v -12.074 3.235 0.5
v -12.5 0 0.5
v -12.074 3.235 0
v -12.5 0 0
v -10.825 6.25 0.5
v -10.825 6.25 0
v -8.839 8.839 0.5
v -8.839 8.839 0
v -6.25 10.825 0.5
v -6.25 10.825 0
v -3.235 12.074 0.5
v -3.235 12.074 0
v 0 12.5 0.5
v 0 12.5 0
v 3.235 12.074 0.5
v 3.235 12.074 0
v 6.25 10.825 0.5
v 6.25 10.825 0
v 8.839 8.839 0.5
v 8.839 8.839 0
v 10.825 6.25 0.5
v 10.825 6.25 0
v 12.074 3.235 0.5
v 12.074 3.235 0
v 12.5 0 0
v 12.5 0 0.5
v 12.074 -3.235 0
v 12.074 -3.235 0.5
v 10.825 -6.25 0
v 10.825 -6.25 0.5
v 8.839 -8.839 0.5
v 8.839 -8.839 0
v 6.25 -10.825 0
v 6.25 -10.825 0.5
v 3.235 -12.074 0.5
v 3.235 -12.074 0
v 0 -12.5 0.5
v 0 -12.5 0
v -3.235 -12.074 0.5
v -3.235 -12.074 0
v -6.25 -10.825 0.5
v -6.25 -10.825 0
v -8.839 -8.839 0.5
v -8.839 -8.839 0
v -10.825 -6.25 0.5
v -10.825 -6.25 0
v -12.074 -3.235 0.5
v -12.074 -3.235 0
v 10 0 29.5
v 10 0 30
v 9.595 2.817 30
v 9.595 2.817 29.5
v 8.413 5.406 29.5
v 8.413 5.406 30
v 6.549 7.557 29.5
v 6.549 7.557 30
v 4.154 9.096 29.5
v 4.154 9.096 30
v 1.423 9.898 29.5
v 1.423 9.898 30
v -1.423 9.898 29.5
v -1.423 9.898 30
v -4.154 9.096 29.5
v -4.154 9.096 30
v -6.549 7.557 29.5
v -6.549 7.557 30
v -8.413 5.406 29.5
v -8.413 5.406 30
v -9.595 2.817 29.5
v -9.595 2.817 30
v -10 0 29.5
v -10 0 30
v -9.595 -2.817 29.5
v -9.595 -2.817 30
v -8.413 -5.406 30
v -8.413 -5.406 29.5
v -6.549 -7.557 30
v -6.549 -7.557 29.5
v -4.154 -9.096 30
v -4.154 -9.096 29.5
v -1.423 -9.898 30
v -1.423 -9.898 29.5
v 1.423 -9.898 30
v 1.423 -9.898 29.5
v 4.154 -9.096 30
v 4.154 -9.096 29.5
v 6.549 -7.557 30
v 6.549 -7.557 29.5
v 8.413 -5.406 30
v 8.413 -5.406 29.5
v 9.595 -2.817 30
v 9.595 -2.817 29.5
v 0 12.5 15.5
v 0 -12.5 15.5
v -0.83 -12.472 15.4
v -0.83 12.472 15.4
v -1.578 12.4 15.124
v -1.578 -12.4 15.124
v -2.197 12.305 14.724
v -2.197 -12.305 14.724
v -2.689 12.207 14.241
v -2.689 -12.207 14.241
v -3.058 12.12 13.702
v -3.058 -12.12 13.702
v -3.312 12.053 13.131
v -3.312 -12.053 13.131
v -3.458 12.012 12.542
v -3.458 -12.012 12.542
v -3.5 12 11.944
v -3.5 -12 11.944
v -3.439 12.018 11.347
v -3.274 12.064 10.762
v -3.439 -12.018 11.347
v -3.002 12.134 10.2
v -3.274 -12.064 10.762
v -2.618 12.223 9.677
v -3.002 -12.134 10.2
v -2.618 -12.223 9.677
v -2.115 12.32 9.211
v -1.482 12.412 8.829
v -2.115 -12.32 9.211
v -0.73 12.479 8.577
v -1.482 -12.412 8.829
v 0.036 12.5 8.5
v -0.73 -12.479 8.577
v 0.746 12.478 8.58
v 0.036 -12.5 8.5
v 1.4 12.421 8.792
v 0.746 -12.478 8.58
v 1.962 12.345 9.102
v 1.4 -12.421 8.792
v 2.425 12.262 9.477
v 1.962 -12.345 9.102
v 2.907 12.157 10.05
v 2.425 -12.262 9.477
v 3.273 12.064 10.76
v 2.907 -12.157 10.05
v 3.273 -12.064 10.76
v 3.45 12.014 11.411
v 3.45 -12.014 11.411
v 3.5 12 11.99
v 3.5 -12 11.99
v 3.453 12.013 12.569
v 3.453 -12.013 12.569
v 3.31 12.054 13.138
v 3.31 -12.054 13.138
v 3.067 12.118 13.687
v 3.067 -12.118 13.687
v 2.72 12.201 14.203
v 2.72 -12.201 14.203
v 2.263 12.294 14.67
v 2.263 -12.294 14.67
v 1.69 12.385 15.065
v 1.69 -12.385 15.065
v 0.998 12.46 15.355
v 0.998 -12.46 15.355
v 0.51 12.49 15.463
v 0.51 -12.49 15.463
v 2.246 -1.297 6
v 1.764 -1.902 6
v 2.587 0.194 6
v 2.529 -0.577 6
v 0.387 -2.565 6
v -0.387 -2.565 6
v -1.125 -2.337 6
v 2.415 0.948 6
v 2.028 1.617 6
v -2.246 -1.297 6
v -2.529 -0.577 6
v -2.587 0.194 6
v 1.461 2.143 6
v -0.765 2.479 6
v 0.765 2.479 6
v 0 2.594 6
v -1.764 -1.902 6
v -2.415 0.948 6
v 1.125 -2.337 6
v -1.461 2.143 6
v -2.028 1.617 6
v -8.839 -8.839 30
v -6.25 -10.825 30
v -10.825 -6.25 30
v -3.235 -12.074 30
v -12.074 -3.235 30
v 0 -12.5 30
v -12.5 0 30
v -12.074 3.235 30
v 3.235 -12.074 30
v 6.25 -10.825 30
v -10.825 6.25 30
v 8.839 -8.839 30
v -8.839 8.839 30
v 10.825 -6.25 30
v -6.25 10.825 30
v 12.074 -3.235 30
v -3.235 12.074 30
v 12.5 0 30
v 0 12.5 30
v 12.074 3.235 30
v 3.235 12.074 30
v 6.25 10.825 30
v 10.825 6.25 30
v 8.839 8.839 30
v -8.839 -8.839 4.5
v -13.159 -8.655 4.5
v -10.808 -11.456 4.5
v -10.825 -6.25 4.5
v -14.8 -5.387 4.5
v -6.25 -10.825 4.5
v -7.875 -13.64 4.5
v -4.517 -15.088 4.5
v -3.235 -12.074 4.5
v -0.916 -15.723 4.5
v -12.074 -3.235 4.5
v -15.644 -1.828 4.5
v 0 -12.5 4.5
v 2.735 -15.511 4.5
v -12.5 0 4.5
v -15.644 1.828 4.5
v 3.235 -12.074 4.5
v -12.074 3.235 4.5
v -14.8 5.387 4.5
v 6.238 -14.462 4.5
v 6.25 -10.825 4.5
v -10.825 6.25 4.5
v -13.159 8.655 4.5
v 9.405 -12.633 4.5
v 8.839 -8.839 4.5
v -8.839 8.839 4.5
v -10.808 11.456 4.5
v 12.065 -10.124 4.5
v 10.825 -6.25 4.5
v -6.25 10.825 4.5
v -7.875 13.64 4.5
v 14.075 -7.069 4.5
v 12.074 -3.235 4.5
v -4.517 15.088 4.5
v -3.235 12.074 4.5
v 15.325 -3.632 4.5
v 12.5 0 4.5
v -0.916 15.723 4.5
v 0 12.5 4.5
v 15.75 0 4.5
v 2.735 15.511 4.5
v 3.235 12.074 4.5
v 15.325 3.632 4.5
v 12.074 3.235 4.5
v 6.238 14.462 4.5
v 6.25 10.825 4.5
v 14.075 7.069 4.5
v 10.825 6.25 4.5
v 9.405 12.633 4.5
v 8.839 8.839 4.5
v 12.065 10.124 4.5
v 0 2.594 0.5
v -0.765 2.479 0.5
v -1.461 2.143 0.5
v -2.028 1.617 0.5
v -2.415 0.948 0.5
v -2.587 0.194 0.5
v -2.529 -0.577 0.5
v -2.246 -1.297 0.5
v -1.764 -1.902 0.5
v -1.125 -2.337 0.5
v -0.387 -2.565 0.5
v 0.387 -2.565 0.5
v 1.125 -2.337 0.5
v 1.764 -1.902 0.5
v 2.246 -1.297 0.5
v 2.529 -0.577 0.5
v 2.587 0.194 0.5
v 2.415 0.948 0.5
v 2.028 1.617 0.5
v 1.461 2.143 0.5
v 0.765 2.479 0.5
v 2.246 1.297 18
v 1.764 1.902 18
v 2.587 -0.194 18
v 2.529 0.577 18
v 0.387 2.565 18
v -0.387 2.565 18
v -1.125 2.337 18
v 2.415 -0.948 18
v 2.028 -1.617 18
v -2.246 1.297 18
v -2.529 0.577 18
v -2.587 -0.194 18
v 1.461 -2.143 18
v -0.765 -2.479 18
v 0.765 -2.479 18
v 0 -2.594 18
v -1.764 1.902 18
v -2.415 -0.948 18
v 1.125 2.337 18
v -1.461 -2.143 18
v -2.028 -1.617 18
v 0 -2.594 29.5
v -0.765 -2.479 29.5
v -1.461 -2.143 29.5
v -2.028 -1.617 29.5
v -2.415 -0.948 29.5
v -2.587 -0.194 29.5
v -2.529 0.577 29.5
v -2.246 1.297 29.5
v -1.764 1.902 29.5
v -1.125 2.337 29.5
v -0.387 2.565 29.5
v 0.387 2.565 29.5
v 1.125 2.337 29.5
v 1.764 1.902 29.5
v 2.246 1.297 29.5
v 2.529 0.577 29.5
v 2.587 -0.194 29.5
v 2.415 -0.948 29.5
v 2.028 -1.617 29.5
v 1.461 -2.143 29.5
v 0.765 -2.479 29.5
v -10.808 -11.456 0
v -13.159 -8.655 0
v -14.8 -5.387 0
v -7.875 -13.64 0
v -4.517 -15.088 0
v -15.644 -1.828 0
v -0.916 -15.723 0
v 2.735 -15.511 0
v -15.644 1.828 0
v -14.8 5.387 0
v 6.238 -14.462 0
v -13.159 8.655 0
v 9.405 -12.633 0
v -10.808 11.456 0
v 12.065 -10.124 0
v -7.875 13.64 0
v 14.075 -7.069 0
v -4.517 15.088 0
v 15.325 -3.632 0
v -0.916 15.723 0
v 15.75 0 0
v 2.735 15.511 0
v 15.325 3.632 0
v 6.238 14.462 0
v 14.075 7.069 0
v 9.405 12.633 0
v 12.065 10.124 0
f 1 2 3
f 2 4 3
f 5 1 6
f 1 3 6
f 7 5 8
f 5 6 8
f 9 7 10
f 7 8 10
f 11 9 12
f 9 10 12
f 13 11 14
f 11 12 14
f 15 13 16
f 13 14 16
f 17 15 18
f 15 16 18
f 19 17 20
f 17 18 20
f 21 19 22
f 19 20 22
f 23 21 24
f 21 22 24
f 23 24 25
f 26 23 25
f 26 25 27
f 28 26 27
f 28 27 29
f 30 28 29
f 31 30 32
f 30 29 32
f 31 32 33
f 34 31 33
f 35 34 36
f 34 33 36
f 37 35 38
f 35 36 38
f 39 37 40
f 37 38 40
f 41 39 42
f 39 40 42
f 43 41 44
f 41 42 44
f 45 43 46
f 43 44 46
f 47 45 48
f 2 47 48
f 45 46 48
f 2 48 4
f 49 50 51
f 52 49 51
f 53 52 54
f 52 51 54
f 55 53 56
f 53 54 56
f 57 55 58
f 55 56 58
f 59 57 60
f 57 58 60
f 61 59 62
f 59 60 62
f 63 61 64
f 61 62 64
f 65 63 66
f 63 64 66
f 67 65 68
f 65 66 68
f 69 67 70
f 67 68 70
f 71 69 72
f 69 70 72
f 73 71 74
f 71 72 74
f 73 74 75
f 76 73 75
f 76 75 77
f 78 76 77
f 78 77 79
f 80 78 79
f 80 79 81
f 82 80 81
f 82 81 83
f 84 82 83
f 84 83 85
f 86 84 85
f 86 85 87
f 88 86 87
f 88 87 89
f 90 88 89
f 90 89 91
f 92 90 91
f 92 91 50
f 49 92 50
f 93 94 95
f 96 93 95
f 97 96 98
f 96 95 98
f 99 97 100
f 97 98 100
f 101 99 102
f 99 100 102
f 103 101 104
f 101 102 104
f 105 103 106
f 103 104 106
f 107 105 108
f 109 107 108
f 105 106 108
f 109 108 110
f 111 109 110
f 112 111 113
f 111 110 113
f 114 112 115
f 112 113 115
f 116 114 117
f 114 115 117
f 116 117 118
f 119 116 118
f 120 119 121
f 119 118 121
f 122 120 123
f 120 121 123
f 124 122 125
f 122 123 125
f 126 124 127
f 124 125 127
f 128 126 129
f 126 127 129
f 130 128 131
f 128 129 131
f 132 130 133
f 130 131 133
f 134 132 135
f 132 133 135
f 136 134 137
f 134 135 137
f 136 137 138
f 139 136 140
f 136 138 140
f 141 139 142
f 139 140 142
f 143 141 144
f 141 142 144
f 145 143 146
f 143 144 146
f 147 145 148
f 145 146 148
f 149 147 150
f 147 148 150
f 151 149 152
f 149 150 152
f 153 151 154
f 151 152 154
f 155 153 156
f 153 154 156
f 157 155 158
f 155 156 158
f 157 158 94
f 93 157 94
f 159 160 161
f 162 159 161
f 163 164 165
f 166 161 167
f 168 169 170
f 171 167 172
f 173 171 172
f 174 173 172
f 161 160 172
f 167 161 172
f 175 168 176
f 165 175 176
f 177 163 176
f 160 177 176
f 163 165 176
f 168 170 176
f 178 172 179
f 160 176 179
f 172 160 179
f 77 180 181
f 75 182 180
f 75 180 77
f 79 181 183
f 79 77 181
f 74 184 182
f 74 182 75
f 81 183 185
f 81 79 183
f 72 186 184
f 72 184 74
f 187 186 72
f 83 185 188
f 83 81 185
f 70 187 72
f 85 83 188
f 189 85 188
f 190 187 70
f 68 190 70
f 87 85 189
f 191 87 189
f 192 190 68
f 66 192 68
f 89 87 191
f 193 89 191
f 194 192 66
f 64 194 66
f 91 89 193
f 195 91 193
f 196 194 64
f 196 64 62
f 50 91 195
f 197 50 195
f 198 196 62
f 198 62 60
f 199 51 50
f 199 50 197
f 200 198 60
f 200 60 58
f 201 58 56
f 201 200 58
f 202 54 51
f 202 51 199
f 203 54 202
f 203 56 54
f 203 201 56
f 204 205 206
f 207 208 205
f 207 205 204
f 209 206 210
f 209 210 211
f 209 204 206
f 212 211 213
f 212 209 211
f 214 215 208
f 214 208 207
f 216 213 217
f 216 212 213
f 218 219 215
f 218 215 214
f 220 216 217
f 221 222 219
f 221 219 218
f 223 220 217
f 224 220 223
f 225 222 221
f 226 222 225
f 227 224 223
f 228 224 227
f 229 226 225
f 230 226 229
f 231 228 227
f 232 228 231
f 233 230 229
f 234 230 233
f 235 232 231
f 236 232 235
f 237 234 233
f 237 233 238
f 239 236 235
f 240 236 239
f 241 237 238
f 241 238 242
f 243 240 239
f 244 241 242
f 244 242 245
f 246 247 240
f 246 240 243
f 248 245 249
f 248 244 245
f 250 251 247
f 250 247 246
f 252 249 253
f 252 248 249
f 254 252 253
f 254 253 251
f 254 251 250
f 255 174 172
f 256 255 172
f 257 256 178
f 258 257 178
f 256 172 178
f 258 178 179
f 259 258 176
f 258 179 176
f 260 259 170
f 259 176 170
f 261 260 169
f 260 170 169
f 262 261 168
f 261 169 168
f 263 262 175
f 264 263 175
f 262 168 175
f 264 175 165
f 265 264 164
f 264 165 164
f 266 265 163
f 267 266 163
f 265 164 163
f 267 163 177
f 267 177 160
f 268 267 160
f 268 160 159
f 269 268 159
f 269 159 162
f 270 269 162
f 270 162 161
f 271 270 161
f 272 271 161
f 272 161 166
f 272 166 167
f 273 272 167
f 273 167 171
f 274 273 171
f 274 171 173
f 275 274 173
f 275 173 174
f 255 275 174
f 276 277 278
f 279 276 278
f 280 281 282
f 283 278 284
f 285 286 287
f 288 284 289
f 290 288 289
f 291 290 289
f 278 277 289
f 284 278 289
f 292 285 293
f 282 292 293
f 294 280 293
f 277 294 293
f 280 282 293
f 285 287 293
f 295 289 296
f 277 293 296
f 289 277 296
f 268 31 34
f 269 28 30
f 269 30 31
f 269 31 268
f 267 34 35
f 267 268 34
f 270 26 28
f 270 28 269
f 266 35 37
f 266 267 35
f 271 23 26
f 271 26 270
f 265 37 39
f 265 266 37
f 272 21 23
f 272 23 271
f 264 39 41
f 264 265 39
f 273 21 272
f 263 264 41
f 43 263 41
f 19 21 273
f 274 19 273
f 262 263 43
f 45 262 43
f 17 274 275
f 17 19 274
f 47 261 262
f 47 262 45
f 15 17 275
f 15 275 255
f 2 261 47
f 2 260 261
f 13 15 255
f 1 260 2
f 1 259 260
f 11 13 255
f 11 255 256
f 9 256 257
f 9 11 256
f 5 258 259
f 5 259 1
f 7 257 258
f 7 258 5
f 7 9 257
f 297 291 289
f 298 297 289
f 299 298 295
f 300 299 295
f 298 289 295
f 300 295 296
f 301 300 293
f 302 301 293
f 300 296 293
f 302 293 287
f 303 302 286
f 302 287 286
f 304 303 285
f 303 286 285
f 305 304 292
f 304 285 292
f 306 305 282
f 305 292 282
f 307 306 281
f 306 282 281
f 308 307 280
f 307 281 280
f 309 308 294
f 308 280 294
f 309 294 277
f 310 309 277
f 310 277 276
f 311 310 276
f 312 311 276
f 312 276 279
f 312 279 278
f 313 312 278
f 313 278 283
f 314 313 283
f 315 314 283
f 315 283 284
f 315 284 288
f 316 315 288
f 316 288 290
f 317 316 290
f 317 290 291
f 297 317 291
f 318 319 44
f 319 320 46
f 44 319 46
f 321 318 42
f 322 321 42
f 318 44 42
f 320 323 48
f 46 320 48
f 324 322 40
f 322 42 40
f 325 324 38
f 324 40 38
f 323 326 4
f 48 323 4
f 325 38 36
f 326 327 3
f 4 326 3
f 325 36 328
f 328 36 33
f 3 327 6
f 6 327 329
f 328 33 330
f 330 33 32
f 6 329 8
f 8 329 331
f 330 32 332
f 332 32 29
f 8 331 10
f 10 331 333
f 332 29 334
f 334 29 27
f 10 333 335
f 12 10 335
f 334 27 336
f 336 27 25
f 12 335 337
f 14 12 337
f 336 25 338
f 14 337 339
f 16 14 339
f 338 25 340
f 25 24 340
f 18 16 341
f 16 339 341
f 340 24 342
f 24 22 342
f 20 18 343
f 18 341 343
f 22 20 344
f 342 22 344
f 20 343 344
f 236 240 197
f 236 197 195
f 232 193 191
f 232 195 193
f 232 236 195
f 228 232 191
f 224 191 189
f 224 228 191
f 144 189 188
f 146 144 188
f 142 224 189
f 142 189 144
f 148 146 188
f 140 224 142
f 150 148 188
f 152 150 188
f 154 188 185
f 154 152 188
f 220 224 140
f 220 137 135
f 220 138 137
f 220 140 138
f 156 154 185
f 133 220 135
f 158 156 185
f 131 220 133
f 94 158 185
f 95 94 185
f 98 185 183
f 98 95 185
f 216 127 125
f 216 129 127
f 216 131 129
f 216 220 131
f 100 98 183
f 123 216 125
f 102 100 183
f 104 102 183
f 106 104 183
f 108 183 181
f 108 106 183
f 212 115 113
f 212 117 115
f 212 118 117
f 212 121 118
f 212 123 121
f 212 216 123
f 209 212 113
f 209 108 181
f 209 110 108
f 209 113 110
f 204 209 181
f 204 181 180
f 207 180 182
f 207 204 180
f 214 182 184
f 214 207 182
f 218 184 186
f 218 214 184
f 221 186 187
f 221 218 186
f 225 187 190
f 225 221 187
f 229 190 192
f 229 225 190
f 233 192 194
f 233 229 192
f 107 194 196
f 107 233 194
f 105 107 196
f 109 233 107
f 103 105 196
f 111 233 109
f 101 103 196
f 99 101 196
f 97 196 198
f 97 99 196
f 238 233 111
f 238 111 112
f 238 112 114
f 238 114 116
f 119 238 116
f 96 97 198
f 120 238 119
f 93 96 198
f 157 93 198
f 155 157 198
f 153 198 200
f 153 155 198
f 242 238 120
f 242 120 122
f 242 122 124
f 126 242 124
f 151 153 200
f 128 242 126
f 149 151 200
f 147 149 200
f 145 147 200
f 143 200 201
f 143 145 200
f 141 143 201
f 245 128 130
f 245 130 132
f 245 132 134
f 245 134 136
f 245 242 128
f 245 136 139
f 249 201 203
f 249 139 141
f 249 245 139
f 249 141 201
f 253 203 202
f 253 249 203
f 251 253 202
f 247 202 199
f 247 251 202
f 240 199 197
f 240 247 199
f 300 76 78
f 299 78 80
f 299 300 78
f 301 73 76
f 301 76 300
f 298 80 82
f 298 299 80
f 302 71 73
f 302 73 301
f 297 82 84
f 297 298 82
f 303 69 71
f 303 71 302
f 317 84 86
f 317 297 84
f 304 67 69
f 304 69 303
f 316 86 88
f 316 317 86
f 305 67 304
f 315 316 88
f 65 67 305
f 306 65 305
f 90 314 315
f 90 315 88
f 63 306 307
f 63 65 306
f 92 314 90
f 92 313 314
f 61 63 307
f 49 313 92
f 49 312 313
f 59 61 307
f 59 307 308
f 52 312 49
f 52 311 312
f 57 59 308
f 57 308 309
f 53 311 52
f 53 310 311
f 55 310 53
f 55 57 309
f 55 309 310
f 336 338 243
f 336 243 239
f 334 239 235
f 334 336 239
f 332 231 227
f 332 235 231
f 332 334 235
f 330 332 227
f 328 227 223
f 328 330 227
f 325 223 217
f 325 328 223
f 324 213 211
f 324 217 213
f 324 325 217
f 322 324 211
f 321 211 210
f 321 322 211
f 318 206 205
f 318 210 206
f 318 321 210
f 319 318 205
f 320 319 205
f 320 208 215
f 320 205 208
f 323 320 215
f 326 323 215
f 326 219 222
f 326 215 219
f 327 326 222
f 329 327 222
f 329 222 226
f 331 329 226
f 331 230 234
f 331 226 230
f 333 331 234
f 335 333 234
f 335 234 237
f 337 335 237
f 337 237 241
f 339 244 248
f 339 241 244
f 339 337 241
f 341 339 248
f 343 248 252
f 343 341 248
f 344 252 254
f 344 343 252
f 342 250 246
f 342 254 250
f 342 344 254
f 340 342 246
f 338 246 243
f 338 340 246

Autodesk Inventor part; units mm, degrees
ref_plane "YZ Plane" through (0, 0, 0) normal (1, 0, 0) x (0, 1, 0)
ref_plane "XZ Plane" through (0, 0, 0) normal (0, 1, 0) x (-1, 0, 0)
ref_plane "XY Plane" through (0, 0, 0) normal (0, 0, 1) x (1, 0, 0)
sketch "Sketch1" plane through (0, 0, 0) normal (0, 0, 1) x (1, 0, 0)
  circle A0 centre (0, 0) radius 15.75
  dimension "d0" = 31.5
extrude "Extrusion1" add sketch "Sketch1" along normal blind 4.5
sketch "Sketch2" plane through (0, 0, 4.5) normal (0, 0, 1) x (1, 0, 0)
  circle A0 centre (0, 0) radius 12.5
  dimension "d3" = 25
extrude "Extrusion2" add sketch "Sketch2" along normal blind 25.5
sketch "Sketch3" plane through (0, 0, 30) normal (0, 0, 1) x (1, 0, 0)
  point P0 (0, 0)
  point P1 (0, 0)
hole "Hole1" at (0, 0, 30) direction (0, 0, -1) diameter 5.188 depth 12 thread size "M6x0.75" class "6H" standard "ANSI Metric M Profile"
sketch "Sketch4" plane through (0, 0, 0) normal (0, 0, -1) x (-1, 0, 0)
  point P0 (0, 0)
  point P1 (0, 0)
hole "Hole2" at (0, 0, 0) direction (0, 0, 1) diameter 5.188 depth 6 thread size "M6x0.75" class "6H" standard "ANSI Metric M Profile"
sketch "Sketch5" plane through (0, 0, 0) normal (0, 1, 0) x (-1, 0, 0)
  line L0 (15.75, 4.5) -> (-15.75, 4.5) projected
  point P0 (0, 0)
  point P1 (0, 12)
  dimension "d24" = 12
  dimension "d25" = 7.5
hole "Hole3" at (0, 0, 12) direction (0, -1, 0) diameter 7 end through all both
sketch "Sketch6" plane through (0, 0, 30) normal (0, 0, 1) x (1, 0, 0)
  circle A0 centre (0, 0) radius 10
  dimension "d33" = 20
extrude "Extrusion3" cut sketch "Sketch6" against normal blind 0.5
sketch "Sketch7" plane through (0, 0, 0) normal (0, 0, -1) x (-1, 0, 0)
  circle A0 centre (0, 0) radius 12.5
  dimension "d36" = 25
extrude "Extrusion4" cut sketch "Sketch7" against normal blind 0.5
properties part number "Poste"
